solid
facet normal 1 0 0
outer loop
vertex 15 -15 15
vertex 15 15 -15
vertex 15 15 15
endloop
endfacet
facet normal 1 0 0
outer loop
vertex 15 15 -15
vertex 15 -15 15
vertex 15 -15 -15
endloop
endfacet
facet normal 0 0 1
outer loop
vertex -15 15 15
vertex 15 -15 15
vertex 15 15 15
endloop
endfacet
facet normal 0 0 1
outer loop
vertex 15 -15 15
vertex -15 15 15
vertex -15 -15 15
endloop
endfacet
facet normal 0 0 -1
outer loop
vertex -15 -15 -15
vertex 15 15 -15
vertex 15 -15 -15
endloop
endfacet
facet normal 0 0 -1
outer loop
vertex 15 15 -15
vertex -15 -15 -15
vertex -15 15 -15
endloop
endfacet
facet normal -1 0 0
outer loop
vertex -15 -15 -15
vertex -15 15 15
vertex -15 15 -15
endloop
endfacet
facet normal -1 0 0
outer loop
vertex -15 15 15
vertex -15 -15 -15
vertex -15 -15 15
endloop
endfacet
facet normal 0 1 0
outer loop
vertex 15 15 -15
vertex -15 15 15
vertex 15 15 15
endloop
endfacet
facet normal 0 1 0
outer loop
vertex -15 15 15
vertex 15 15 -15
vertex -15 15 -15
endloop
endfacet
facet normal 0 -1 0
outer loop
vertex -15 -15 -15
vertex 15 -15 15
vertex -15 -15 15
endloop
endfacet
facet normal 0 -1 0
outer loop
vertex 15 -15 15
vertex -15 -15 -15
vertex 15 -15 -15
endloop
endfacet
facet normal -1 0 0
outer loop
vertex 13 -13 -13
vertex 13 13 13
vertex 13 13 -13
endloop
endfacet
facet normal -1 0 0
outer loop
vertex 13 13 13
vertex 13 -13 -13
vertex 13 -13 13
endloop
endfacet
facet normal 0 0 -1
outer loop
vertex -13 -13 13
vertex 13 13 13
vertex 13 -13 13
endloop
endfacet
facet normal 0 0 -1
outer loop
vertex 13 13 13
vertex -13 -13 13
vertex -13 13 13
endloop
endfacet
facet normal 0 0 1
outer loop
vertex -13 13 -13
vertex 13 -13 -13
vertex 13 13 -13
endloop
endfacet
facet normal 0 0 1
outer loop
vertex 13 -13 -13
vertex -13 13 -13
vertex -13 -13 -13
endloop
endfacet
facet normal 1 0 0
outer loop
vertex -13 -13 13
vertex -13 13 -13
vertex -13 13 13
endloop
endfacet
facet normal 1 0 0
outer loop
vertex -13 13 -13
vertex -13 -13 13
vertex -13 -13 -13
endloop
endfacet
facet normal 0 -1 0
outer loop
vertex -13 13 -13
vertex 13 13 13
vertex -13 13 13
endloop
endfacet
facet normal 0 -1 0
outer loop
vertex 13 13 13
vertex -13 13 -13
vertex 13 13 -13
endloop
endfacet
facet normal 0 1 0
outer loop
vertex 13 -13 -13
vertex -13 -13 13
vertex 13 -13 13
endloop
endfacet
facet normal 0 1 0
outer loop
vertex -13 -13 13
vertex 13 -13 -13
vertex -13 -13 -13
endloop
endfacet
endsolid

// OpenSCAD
// Parameterized cube module with optional rounded edges and hollow interior
module param_cube(
    size = [50, 50, 50],  // [x, y, z] dimensions
    center = true,        // center the cube
    wall_thickness = 2,   // wall thickness for hollow cube (0 for solid)
    corner_radius = 0,    // radius for rounded corners (0 for sharp corners)
    $fn = 32             // resolution for rounded corners
) {
    // Validate inputs
    assert(len(size) == 3, "Size must be a vector of [x, y, z] dimensions");
    assert(wall_thickness >= 0, "Wall thickness must be non-negative");
    assert(corner_radius >= 0, "Corner radius must be non-negative");
    
    // Create solid or hollow cube
    difference() {
        // Outer cube
        if (corner_radius > 0) {
            // Rounded cube using minkowski
            minkowski() {
                cube([
                    size[0] - 2 * corner_radius,
                    size[1] - 2 * corner_radius,
                    size[2] - 2 * corner_radius
                ], center = center);
                sphere(r = corner_radius);
            }
        } else {
            // Regular cube
            cube(size, center = center);
        }
        
        // Interior hollow (if wall_thickness > 0)
        if (wall_thickness > 0) {
            translate([0, 0, 0])
            cube([
                size[0] - 2 * wall_thickness,
                size[1] - 2 * wall_thickness,
                size[2] - 2 * wall_thickness
            ], center = center);
        }
    }
}

// Example usage:
param_cube([30, 30, 30]);
